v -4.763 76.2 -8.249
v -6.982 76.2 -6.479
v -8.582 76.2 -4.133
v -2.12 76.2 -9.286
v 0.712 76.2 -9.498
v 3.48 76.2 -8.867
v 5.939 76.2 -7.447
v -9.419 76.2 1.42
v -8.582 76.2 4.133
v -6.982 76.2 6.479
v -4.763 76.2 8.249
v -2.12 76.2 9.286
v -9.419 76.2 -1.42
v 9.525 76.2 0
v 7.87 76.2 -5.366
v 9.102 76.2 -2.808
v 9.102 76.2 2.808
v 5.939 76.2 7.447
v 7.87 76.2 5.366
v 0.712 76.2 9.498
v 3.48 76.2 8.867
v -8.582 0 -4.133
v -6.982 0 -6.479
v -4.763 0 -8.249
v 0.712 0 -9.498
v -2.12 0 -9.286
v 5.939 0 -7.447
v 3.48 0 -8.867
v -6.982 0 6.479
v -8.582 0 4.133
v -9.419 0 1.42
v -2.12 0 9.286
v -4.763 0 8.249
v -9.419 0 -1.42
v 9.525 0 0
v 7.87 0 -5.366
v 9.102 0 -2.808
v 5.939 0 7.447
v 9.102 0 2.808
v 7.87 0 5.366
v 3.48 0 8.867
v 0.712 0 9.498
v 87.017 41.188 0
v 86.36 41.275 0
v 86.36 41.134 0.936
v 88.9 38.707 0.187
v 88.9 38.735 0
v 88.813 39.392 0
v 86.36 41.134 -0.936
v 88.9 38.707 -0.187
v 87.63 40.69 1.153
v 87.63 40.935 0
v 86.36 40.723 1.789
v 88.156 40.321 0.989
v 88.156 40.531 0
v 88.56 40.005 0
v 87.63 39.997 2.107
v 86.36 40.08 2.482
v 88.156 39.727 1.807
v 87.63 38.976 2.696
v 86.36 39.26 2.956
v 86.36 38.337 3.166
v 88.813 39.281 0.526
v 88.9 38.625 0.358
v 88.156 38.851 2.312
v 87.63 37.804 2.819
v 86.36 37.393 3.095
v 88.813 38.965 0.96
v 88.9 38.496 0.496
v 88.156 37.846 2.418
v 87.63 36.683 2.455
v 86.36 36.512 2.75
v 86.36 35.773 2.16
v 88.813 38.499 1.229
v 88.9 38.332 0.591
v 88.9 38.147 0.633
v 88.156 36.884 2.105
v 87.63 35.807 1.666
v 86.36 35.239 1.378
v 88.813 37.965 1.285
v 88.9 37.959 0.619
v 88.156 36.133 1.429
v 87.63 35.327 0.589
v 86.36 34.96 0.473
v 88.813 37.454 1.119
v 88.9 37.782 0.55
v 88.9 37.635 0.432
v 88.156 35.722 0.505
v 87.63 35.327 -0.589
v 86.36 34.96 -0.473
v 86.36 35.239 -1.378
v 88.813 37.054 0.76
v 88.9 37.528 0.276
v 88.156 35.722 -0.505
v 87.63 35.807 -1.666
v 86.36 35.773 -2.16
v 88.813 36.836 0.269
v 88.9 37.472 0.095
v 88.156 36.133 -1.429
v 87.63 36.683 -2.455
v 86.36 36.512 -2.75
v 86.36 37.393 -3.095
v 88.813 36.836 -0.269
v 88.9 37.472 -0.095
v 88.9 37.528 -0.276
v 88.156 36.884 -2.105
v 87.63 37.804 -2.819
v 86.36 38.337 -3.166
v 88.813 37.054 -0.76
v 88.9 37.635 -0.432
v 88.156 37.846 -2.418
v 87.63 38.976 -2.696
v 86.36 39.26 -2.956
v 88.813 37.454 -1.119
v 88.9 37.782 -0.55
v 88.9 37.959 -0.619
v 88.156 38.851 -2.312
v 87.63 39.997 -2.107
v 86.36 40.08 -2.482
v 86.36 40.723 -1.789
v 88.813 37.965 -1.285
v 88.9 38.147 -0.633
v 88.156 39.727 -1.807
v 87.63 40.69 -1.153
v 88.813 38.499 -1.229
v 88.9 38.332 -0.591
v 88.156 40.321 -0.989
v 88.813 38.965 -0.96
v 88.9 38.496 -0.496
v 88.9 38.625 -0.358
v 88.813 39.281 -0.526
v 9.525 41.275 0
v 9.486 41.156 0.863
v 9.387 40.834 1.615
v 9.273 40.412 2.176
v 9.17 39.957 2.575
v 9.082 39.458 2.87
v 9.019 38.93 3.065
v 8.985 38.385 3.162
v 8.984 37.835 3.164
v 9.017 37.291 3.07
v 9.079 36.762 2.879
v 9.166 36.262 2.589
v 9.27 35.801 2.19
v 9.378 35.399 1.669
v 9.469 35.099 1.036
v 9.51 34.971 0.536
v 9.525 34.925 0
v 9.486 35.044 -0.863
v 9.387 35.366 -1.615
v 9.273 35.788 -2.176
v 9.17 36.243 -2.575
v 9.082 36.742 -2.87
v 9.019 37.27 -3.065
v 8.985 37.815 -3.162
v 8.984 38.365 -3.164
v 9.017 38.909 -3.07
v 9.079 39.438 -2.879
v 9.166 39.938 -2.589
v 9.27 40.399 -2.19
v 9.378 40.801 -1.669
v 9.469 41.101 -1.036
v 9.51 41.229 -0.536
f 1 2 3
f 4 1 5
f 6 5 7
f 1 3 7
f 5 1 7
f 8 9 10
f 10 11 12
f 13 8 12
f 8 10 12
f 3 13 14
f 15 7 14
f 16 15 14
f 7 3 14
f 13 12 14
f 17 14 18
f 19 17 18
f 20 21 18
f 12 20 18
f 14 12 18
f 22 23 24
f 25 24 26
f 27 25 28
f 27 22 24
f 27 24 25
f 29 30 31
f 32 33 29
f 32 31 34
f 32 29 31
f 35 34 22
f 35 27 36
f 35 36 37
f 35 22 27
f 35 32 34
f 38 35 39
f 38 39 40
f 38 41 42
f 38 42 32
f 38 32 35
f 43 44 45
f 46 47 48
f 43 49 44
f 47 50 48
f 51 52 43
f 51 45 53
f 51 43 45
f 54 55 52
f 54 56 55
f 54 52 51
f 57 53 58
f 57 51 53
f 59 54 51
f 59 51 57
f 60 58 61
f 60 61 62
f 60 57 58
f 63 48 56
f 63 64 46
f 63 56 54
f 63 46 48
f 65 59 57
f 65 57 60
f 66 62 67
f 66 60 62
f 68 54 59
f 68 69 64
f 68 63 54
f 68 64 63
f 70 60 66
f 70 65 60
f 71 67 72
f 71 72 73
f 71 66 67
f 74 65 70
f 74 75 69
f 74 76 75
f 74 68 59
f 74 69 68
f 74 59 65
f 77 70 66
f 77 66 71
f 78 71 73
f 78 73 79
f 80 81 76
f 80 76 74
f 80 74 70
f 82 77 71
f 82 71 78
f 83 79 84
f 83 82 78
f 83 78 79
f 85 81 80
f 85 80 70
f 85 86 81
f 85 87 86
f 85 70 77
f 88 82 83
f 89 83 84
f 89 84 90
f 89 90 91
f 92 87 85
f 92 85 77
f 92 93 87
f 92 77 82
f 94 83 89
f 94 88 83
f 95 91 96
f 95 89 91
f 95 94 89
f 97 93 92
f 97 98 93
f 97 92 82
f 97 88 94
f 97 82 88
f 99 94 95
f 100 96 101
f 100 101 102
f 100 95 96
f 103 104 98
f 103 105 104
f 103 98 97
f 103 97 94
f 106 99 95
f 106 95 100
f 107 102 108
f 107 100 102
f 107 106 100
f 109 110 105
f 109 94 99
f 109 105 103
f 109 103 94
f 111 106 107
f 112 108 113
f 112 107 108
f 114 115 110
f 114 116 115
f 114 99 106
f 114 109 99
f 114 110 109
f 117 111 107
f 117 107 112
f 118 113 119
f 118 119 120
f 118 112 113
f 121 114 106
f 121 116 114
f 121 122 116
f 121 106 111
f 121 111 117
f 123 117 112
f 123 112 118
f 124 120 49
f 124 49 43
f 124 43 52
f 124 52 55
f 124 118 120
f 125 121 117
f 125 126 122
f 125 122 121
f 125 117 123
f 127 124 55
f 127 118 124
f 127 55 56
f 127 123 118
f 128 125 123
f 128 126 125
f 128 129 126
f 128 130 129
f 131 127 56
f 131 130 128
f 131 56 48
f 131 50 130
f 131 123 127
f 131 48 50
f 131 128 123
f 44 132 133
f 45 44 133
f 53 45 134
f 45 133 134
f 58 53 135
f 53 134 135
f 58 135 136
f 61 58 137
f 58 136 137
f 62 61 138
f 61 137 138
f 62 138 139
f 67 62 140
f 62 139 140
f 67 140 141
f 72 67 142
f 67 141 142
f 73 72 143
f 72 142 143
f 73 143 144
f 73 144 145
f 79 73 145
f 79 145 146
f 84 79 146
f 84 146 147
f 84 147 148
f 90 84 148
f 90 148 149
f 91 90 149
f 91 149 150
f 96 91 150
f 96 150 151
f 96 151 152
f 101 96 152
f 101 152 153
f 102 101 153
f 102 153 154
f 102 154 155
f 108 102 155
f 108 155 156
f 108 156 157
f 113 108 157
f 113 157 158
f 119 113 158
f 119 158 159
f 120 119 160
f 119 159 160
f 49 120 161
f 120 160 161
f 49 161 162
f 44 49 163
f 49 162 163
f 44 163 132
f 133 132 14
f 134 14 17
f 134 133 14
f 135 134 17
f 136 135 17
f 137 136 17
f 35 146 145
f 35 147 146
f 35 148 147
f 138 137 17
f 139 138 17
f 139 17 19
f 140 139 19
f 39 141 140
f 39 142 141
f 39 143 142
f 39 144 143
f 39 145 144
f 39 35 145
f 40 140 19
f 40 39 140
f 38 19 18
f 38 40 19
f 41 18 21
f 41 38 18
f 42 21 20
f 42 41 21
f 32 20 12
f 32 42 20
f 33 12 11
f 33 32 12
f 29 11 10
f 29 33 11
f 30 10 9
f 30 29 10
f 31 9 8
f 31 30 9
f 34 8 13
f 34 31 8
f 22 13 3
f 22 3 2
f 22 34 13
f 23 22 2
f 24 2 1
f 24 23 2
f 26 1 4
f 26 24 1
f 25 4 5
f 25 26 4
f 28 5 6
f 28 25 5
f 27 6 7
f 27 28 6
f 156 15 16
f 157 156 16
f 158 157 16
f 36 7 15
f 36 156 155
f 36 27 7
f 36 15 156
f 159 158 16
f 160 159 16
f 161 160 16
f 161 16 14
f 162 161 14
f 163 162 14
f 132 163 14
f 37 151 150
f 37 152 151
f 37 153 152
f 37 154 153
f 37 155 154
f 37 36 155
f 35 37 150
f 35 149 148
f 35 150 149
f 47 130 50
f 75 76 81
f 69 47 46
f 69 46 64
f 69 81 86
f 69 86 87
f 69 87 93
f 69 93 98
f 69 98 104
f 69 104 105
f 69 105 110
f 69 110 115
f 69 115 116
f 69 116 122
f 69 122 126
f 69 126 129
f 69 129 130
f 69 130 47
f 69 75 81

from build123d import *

# Parameters (mm, degrees)
F0_R     = 9.525
F1_DEPTH = 76.2
F2_R     = 3.175
F3_DEPTH = 88.9
F4_R     = 2.54


with BuildPart() as f1:
    # F0 (on Front) → F1 (new body)
    with BuildSketch(Plane.XZ):
        Circle(F0_R)
    extrude(amount=-F1_DEPTH)

    # F2 (on Right) → F3 (join)
    with BuildSketch(Plane.YZ):
        with Locations((38.1, 0)):
            Circle(F2_R)
    extrude(amount=F3_DEPTH)

    # F4
    f4_edges = [f1.edges().sort_by_distance(p)[0] for p in [
        (88.9, 34.925, 0),
    ]]
    fillet(f4_edges, radius=F4_R)


solid = f1.part
